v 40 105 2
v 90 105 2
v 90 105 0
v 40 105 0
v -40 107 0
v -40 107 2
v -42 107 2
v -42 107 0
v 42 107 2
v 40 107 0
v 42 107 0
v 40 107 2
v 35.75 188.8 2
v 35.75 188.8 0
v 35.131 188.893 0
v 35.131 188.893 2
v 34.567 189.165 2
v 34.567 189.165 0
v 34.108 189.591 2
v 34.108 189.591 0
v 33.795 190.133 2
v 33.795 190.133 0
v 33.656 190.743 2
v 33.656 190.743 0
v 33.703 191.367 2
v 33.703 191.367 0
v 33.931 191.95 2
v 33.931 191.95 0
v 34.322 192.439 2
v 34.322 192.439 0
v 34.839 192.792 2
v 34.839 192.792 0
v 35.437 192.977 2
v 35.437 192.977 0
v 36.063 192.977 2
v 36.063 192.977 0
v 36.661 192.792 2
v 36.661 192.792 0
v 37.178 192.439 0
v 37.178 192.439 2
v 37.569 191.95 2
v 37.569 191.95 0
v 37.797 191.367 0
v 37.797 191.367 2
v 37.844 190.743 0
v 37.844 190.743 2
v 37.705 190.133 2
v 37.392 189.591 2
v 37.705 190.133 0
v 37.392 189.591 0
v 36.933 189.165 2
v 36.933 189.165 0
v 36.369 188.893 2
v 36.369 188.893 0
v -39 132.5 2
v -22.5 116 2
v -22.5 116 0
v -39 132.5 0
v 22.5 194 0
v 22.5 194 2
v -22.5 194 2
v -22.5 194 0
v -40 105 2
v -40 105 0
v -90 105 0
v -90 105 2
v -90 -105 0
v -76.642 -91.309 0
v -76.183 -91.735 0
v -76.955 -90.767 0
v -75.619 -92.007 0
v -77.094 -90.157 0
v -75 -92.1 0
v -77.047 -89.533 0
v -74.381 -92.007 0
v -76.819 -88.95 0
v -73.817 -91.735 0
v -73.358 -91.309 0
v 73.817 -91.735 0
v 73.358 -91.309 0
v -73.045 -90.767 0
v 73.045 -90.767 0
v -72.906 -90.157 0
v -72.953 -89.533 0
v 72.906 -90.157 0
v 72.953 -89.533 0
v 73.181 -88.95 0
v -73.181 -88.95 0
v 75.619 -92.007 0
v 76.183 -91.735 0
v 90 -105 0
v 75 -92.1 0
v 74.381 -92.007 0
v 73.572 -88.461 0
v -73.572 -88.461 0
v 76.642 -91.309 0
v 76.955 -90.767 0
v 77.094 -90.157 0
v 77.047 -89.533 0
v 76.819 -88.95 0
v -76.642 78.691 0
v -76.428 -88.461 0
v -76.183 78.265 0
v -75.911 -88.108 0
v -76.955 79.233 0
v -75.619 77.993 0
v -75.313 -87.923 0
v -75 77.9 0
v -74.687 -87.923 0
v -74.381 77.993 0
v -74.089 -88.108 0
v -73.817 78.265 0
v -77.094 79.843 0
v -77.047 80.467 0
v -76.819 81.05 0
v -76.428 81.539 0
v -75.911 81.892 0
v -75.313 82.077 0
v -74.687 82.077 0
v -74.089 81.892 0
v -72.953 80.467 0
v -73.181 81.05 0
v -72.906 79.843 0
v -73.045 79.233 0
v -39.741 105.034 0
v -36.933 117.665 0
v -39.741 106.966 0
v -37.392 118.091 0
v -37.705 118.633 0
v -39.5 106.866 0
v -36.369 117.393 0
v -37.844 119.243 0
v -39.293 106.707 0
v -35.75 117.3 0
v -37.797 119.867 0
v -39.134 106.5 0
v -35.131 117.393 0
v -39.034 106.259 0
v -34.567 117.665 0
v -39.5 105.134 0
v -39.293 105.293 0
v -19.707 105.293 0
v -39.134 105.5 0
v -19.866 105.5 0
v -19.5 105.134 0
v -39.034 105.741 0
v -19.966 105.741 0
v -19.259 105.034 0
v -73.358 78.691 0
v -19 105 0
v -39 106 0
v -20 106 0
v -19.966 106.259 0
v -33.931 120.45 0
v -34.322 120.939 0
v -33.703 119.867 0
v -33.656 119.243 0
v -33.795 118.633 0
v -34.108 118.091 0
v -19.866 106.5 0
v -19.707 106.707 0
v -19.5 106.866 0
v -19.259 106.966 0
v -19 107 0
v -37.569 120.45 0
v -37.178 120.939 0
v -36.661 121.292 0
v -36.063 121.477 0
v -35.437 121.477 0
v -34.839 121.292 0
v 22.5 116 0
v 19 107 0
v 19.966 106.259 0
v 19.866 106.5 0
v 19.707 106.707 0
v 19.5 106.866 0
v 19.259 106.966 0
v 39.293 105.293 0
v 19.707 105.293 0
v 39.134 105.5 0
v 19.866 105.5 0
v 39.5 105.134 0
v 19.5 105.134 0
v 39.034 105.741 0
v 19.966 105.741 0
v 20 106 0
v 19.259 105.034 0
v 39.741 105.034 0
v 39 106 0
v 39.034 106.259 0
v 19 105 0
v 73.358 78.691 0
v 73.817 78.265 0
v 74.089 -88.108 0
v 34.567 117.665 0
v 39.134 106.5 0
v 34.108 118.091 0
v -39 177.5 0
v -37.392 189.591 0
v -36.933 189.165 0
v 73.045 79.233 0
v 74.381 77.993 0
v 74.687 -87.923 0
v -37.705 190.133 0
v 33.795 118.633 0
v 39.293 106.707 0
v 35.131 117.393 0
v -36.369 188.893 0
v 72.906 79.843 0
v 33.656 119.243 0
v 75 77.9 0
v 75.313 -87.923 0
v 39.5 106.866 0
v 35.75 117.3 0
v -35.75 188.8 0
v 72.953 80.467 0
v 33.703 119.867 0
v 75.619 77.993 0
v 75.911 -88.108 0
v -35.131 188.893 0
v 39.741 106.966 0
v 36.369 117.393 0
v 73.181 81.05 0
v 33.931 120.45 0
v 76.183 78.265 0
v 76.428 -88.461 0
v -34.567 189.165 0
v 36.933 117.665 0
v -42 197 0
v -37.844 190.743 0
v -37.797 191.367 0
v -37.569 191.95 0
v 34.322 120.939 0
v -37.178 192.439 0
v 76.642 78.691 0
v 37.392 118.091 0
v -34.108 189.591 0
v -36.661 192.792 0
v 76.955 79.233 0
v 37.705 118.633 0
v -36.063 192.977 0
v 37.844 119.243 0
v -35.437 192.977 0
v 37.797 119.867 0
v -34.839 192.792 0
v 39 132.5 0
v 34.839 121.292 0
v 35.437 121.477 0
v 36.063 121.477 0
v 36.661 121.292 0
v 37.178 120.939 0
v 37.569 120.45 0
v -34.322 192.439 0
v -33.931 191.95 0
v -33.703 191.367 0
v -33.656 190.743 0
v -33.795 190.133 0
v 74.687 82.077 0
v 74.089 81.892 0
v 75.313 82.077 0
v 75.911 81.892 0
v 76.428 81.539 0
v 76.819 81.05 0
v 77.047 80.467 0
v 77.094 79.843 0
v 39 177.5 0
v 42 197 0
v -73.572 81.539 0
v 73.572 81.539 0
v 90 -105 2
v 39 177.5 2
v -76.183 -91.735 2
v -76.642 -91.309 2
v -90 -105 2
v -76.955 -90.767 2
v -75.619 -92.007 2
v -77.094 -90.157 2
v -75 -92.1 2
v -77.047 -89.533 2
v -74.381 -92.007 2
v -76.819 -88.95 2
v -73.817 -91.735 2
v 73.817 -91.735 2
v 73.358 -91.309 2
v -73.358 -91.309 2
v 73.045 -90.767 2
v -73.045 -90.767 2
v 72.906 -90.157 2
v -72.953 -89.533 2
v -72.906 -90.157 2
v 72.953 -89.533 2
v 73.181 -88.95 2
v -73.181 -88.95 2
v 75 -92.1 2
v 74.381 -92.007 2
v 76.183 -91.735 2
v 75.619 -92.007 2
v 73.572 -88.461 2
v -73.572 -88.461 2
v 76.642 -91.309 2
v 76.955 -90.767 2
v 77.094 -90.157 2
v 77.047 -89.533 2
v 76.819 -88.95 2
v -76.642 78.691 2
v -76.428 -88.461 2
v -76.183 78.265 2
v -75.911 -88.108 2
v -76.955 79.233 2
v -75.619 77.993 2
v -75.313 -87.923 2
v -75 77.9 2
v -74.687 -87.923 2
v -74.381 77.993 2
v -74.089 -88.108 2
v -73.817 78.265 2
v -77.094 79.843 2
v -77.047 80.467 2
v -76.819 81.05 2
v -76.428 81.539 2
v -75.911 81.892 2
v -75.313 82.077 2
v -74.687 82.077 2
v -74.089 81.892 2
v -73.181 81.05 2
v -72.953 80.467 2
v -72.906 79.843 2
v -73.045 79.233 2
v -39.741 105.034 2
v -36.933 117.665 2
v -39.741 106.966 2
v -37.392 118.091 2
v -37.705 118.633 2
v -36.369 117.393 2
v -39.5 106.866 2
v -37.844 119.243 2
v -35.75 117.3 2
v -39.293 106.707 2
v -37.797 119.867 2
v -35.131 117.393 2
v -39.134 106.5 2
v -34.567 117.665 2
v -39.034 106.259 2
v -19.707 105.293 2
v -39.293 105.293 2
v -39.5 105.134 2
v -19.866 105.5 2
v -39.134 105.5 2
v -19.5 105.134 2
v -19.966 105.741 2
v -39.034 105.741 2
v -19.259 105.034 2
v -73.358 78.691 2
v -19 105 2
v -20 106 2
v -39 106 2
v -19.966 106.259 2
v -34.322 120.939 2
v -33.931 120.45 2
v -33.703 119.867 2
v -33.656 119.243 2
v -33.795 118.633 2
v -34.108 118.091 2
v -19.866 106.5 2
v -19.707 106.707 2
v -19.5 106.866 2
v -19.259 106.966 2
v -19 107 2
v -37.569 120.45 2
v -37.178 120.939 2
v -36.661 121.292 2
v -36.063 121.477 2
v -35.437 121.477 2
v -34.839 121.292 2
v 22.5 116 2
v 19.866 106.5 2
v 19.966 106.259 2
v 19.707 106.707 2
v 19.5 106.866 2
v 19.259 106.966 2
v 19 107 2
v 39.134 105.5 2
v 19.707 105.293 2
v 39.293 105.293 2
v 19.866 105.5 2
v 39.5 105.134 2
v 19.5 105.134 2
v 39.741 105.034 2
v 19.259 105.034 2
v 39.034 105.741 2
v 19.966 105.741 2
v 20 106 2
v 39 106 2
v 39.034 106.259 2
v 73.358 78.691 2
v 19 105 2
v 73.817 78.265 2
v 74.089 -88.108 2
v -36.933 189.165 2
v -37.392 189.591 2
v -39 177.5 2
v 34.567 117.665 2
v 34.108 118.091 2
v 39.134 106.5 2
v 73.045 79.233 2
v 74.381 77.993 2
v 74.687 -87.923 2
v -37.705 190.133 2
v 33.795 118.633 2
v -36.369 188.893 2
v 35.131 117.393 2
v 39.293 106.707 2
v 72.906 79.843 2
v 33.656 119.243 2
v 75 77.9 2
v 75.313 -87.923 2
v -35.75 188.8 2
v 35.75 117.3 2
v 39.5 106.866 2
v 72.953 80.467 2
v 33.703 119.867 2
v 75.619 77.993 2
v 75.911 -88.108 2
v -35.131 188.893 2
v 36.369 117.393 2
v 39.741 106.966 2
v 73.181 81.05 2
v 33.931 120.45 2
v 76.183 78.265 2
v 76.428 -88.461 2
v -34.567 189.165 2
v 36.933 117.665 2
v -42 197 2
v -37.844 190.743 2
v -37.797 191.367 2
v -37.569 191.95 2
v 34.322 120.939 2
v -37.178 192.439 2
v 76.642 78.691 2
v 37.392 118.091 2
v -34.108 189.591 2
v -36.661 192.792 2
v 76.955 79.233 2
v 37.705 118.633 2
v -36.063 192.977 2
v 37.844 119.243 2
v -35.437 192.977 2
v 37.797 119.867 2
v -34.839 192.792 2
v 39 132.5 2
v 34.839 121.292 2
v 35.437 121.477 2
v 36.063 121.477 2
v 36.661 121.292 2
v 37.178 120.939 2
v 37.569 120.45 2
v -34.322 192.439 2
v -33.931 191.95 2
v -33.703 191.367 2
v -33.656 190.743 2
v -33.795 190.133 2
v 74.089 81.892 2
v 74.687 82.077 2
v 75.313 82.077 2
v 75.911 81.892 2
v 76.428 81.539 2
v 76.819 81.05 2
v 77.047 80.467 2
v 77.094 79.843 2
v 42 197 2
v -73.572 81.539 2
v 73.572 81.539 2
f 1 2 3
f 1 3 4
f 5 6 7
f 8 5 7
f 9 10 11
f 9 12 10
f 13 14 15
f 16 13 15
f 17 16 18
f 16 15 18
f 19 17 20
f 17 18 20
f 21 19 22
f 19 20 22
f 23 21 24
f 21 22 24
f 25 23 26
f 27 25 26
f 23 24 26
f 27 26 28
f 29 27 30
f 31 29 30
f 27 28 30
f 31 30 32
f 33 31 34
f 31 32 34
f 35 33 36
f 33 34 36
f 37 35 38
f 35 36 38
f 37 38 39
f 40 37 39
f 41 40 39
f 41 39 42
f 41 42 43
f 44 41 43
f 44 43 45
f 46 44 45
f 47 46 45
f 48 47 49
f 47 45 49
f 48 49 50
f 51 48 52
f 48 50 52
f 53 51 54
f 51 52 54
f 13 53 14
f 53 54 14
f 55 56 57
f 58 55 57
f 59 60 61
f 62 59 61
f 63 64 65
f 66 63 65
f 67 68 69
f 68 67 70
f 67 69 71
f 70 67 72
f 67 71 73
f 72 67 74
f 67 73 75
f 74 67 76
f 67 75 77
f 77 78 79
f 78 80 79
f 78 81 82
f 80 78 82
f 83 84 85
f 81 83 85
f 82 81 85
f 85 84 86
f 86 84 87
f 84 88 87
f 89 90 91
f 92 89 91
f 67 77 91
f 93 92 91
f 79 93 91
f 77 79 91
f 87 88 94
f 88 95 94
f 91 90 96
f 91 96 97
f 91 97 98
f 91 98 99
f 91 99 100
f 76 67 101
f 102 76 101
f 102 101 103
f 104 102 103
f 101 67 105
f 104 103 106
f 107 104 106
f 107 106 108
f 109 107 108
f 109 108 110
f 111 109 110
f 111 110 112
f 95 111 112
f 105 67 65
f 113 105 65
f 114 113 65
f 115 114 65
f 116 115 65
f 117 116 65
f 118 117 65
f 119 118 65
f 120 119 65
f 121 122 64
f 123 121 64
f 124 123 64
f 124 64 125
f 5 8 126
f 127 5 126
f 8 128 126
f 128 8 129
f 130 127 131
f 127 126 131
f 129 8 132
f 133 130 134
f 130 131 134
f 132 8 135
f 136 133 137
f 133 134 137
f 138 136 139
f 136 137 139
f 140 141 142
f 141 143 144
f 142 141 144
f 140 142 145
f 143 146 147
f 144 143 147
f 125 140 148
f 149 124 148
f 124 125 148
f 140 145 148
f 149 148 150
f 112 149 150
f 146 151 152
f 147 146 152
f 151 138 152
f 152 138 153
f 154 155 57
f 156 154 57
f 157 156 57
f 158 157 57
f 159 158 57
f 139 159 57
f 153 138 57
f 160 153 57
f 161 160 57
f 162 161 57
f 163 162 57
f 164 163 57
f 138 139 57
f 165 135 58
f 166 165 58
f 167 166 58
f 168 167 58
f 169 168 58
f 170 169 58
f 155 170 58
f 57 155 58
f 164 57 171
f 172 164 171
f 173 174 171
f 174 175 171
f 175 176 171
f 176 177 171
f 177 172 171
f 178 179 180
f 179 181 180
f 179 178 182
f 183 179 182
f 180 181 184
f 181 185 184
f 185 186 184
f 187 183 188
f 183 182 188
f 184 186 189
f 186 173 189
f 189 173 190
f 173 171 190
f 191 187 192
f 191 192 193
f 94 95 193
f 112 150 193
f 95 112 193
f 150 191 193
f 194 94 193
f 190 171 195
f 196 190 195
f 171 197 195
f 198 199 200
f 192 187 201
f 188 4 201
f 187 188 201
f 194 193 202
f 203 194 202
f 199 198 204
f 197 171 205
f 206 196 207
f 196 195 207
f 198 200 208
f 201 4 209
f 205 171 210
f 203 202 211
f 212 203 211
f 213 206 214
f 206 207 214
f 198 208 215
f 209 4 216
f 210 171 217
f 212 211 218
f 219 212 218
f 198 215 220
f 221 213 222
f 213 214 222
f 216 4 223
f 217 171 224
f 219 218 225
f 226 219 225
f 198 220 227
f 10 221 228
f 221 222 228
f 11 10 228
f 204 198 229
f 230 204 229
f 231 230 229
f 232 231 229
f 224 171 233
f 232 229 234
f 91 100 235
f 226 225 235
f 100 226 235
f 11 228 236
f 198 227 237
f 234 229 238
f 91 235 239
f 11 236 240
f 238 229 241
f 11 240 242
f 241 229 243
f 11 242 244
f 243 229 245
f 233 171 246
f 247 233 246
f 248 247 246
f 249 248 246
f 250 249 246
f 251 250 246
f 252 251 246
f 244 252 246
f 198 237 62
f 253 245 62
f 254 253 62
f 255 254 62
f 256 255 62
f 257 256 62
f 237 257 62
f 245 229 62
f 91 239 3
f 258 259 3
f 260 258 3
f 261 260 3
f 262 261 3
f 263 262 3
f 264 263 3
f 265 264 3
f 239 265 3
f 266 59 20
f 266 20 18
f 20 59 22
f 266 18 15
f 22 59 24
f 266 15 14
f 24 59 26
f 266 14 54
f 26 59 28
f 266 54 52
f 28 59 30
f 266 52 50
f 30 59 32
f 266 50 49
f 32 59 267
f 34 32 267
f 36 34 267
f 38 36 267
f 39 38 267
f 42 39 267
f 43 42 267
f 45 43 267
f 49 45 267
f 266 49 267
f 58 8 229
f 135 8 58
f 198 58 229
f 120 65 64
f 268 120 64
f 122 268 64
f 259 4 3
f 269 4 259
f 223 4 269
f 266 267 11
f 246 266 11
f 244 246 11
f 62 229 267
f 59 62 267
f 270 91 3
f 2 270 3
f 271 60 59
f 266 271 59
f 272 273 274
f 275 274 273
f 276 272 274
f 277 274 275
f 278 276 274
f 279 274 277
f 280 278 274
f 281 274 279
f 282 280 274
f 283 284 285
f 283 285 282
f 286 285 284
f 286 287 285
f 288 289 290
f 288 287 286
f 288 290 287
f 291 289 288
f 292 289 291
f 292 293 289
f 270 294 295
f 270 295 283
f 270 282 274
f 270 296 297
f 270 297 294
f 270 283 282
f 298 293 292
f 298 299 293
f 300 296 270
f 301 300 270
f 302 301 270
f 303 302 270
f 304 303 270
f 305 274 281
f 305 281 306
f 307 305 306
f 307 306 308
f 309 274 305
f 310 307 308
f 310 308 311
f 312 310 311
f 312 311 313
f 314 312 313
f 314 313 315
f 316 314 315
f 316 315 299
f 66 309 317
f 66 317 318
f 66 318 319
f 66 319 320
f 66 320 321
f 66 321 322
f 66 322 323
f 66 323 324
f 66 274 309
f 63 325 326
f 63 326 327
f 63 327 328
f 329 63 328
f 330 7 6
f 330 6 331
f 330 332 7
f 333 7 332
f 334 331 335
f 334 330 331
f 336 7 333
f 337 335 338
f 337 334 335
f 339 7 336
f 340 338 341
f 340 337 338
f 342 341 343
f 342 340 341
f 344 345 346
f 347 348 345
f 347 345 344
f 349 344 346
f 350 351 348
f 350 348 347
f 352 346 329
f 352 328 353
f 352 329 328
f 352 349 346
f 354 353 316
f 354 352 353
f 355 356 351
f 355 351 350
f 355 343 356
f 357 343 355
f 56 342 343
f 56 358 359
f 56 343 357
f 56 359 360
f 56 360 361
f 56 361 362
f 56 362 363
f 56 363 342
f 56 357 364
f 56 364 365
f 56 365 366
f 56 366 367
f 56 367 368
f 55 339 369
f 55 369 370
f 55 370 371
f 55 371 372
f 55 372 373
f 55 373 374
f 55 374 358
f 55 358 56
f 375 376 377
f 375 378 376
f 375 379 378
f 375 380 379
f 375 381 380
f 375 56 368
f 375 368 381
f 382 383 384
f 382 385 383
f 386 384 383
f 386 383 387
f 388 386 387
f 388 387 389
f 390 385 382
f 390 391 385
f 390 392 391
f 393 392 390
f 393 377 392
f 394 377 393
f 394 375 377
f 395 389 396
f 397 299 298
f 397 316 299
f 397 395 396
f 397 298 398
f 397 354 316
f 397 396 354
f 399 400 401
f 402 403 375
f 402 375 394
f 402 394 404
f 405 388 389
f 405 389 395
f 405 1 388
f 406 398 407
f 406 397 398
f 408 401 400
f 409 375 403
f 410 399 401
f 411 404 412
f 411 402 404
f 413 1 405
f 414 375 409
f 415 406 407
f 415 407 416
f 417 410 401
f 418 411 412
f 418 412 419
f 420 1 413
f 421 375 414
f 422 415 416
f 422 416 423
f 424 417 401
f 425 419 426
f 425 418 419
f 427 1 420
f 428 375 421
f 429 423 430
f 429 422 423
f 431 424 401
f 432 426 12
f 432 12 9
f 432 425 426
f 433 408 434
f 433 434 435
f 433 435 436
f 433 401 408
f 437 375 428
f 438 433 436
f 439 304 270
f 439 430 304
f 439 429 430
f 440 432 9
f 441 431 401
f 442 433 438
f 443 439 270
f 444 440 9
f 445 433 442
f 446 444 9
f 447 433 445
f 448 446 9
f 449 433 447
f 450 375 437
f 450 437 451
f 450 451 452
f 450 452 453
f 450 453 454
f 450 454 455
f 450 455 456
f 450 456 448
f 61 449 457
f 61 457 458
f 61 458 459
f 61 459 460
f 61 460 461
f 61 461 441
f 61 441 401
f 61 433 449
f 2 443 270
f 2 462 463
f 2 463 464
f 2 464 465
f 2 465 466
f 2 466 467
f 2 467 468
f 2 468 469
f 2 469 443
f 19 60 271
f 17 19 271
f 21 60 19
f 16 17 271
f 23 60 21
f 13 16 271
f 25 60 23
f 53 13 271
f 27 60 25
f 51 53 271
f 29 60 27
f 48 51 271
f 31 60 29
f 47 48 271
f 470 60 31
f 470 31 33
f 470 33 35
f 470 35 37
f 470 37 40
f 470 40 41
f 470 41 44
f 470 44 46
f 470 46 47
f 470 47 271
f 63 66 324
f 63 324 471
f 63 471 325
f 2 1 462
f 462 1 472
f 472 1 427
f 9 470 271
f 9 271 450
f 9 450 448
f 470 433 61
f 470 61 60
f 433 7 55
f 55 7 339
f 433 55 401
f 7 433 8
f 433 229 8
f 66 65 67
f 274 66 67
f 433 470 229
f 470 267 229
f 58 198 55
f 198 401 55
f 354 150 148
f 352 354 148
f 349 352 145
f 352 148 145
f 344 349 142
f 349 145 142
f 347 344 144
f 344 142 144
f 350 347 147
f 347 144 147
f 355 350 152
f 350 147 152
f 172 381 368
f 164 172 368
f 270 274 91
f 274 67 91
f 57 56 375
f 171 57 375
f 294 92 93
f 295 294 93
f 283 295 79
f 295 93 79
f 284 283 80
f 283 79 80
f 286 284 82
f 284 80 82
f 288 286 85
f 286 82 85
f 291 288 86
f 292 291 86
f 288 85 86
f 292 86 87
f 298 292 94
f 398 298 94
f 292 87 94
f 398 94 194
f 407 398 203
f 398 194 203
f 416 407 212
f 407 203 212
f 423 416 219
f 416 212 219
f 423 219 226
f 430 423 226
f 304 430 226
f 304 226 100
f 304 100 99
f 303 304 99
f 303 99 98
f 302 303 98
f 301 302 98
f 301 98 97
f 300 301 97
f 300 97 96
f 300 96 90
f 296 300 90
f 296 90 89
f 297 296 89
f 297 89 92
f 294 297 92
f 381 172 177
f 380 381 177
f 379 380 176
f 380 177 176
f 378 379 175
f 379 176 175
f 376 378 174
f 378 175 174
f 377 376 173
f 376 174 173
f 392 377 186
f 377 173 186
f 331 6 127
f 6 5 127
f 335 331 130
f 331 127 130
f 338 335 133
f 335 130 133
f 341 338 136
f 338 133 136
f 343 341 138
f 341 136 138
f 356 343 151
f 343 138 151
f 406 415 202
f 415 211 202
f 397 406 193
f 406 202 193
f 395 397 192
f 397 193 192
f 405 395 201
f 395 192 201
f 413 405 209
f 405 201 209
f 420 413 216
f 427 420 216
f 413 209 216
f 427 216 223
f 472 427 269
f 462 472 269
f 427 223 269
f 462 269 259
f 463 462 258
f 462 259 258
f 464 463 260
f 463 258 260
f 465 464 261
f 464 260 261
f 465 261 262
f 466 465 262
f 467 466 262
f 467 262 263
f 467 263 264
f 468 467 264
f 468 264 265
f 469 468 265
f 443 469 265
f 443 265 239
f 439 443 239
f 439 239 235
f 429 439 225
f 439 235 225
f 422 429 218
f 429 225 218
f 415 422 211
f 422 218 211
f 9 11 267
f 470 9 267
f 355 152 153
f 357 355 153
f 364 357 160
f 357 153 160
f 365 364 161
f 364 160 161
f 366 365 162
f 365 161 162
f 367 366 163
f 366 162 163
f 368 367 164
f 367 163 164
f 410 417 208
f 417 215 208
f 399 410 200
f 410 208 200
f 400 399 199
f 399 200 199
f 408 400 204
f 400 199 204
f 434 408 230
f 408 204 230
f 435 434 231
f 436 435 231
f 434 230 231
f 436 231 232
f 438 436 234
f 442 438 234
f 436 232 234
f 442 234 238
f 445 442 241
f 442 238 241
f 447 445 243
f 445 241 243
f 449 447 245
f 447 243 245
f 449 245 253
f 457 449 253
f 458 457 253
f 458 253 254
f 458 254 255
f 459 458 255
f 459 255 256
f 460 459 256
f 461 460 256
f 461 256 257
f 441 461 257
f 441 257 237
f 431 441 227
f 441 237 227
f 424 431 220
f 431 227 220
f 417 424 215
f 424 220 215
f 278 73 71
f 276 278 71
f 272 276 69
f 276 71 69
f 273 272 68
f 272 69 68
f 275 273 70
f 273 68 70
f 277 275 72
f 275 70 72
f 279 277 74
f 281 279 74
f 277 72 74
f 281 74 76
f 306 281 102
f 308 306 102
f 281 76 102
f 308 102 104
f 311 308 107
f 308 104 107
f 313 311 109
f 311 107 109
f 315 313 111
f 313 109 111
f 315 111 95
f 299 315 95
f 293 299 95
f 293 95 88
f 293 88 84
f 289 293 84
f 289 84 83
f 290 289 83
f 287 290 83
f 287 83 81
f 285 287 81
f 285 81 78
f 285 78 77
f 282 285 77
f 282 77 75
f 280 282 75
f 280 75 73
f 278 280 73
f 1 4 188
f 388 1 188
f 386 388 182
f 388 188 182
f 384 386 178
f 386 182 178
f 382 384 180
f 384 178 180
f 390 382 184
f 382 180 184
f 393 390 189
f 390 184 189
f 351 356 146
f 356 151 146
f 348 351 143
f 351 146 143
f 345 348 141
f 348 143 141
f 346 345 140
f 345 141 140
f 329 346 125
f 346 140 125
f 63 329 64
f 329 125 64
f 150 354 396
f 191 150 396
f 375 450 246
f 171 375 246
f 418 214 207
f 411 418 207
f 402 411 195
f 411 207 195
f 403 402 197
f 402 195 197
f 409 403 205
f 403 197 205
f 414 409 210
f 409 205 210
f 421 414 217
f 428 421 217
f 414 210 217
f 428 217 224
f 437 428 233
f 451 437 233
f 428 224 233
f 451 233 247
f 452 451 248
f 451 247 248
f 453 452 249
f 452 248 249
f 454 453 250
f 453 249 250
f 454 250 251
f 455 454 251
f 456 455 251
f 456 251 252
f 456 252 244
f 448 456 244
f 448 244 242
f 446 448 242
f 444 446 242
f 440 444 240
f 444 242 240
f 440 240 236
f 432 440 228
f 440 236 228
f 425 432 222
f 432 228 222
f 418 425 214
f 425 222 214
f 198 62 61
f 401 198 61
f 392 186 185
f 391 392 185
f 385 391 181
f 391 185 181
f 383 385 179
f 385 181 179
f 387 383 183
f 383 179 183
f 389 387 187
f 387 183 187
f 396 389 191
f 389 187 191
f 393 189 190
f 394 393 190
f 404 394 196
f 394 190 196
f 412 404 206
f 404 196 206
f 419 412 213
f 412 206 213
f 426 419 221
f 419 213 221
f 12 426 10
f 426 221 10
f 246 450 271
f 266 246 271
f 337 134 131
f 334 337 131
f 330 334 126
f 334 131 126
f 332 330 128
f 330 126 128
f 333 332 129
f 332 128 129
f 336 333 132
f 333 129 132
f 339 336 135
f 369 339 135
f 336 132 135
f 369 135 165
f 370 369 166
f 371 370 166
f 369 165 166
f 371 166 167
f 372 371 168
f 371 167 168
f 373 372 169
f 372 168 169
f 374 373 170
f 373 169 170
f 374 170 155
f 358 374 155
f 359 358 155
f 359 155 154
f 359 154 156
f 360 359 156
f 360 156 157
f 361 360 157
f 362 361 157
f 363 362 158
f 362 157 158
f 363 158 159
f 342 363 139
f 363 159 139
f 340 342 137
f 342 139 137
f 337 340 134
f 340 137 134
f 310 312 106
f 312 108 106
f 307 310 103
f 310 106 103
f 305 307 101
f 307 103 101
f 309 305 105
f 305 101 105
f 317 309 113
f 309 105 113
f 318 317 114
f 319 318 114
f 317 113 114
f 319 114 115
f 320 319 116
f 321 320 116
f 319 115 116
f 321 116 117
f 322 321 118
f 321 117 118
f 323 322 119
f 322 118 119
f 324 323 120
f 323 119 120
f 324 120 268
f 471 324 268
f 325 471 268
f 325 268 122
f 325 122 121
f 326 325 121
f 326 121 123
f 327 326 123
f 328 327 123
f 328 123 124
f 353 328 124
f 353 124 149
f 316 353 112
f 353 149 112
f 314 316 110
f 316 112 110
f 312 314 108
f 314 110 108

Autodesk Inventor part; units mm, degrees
ref_plane "YZ Plane" through (0, 0, 0) normal (1, 0, 0) x (0, 1, 0)
ref_plane "XZ Plane" through (0, 0, 0) normal (0, 1, 0) x (-1, 0, 0)
ref_plane "XY Plane" through (0, 0, 0) normal (0, 0, 1) x (1, 0, 0)
sketch "Sketch1" plane through (0, 0, 0) normal (0, 0, 1) x (1, 0, 0)
  line L0 (-90, -105) -> (90, -105)
  line L1 (90, -105) -> (90, 105)
  line L2 (-90, 105) -> (-90, -105)
  line L3 (42, 105) -> (42, 197)
  line L4 (42, 197) -> (-42, 197)
  line L5 (-42, 197) -> (-42, 105)
  line L6 (90, 105) -> (42, 105)
  line L7 (-42, 105) -> (-90, 105)
  point P0 (0, 0)
  dimension "d0" = 180
  dimension "d1" = 210
  dimension "d2" = 105
  dimension "d3" = 90
  dimension "d22" = 92
  dimension "d24" = 42
  dimension "d26" = 84
  dimension "d28" = 92
  dimension "d29" = 210
  dimension "d30" = 48
  dimension "d31" = 48
extrude "Extrusion1" add sketch "Sketch1" along normal blind 2
sketch "Sketch2" plane through (0, 0, 2) normal (0, 0, 1) x (1, 0, 0)
  line L0 (-90, -105) -> (90, -105) projected
  line L1 (-42, 105) -> (-90, 105) projected
  point P0 (0, 0)
  point P1 (-75, 80)
  point P2 (75, 80)
  point P3 (-75, -90)
  point P4 (75, -90)
  dimension "d6" = 170
  dimension "d8" = 150
  dimension "d9" = 75
  dimension "d10" = 150
  dimension "d11" = 15
  dimension "d12" = 15
  dimension "d13" = 170
  dimension "d14" = 75
  dimension "d27" = 25
hole "Hole1" at (-75, 80, 2) at (75, 80, 2) at (-75, -90, 2) at (75, -90, 2) direction (0, 0, -1) diameter 4.2 end through all
sketch "Sketch3" plane through (0, 0, 2) normal (0, 0, 1) x (1, 0, 0)
  line L0 (-90, 105) -> (-90, -105) projected
  line L1 (90, 105) -> (42, 105) projected
  line L2 (-39, 116) -> (39, 116)
  line L3 (39, 116) -> (39, 194)
  line L4 (39, 194) -> (-39, 194)
  line L5 (-39, 194) -> (-39, 116)
  point P0 (0, 0)
  dimension "d46" = 78
  dimension "d47" = 39
  dimension "d48" = 78
  dimension "d49" = 11
extrude "Extrusion2" cut sketch "Sketch3" against normal blind 10
chamfer "Chamfer1" distance 16.5 angle 45 4 edges at (-39, 116, 1) (39, 116, 1) (-39, 194, 1) (39, 194, 1)
sketch "Sketch4" plane through (0, 0, 2) normal (0, 0, 1) x (1, 0, 0)
  line L0 (-35.75, 190.9) -> (35.75, 190.9) construction
  line L1 (35.75, 190.9) -> (35.75, 119.4) construction
  line L2 (35.75, 119.4) -> (-35.75, 119.4) construction
  line L3 (-35.75, 119.4) -> (-35.75, 190.9) construction
  line L4 (90, 105) -> (42, 105) construction
  point P0 (0, 0)
  dimension "d53" = 71.5
  dimension "d54" = 35.75
  dimension "d55" = 71.5
  dimension "d56" = 14.4
hole "Hole2" at (-35.75, 190.9, 2) at (35.75, 190.9, 2) at (-35.75, 119.4, 2) at (35.75, 119.4, 2) direction (0, 0, -1) diameter 4.2 end through all
sketch "Sketch5" plane through (0, 0, 2) normal (0, 0, 1) x (1, 0, 0)
  line L0 (-42, 197) -> (-42, 105) projected
  line L1 (-42, 105) -> (-39, 105)
  line L2 (-39, 105) -> (-39, 107)
  line L3 (-39, 107) -> (-42, 107)
  line L4 (-42, 107) -> (-42, 105)
  line L5 (90, 105) -> (42, 105) projected
  line L6 (42, 105) -> (39, 105)
  line L7 (39, 105) -> (39, 107)
  line L8 (39, 107) -> (42, 107)
  line L9 (42, 107) -> (42, 105)
  line L10 (-20, 105) -> (20, 105)
  line L11 (20, 105) -> (20, 107)
  line L12 (20, 107) -> (-20, 107)
  line L13 (-20, 107) -> (-20, 105)
  point P0 (0, 0)
  dimension "d64" = 2
  dimension "d65" = 2
  dimension "d66" = 2
  dimension "d67" = 3
  dimension "d68" = 3
  dimension "d69" = 40
  dimension "d70" = 20
extrude "Extrusion3" cut sketch "Sketch5" against normal blind 10
fillet "Fillet1" radius 1 8 edges at (-39, 105, 1) (-39, 107, 1) (-20, 107, 1) (-20, 105, 1) (20, 105, 1) (20, 107, 1) (39, 107, 1) (39, 105, 1)
equation "\"d2\" = 0.5 * d1"
equation "\"d3\" = 0.5 * d0"
equation "\"d24\" = 0.5 * d26"
equation "\"d28\" = d22"
equation "\"d9\" = 0.5 * d8"
equation "\"d10\" = d8"
equation "\"d12\" = d11"
equation "\"d13\" = d6"
equation "\"d14\" = d9"
equation "\"d20\" = Thickness"
equation "\"d47\" = 0.5 * d46"
equation "\"d48\" = d46"
equation "\"d54\" = 0.5 * d53"
equation "\"d55\" = d53"
equation "\"d62\" = Thickness"
equation "\"d70\" = 0.5 * d69"
equation "\"BendRadius\" = Thickness"
equation "\"BendReliefWidth\" = Thickness"
equation "\"BendReliefDepth\" = 0.5 * Thickness"
equation "\"CornerReliefSize\" = 4 * Thickness"
equation "\"MinimumRemnant\" = 2 * Thickness"
equation "\"TransitionRadius\" = BendRadius"
equation "\"JacobiRadiusSize\" = BendRadius"
equation "\"GapSize\" = Thickness"
equation "\"Thickness\" = 0.5"
properties part number "XGEN_hotbed-pcb-org"
